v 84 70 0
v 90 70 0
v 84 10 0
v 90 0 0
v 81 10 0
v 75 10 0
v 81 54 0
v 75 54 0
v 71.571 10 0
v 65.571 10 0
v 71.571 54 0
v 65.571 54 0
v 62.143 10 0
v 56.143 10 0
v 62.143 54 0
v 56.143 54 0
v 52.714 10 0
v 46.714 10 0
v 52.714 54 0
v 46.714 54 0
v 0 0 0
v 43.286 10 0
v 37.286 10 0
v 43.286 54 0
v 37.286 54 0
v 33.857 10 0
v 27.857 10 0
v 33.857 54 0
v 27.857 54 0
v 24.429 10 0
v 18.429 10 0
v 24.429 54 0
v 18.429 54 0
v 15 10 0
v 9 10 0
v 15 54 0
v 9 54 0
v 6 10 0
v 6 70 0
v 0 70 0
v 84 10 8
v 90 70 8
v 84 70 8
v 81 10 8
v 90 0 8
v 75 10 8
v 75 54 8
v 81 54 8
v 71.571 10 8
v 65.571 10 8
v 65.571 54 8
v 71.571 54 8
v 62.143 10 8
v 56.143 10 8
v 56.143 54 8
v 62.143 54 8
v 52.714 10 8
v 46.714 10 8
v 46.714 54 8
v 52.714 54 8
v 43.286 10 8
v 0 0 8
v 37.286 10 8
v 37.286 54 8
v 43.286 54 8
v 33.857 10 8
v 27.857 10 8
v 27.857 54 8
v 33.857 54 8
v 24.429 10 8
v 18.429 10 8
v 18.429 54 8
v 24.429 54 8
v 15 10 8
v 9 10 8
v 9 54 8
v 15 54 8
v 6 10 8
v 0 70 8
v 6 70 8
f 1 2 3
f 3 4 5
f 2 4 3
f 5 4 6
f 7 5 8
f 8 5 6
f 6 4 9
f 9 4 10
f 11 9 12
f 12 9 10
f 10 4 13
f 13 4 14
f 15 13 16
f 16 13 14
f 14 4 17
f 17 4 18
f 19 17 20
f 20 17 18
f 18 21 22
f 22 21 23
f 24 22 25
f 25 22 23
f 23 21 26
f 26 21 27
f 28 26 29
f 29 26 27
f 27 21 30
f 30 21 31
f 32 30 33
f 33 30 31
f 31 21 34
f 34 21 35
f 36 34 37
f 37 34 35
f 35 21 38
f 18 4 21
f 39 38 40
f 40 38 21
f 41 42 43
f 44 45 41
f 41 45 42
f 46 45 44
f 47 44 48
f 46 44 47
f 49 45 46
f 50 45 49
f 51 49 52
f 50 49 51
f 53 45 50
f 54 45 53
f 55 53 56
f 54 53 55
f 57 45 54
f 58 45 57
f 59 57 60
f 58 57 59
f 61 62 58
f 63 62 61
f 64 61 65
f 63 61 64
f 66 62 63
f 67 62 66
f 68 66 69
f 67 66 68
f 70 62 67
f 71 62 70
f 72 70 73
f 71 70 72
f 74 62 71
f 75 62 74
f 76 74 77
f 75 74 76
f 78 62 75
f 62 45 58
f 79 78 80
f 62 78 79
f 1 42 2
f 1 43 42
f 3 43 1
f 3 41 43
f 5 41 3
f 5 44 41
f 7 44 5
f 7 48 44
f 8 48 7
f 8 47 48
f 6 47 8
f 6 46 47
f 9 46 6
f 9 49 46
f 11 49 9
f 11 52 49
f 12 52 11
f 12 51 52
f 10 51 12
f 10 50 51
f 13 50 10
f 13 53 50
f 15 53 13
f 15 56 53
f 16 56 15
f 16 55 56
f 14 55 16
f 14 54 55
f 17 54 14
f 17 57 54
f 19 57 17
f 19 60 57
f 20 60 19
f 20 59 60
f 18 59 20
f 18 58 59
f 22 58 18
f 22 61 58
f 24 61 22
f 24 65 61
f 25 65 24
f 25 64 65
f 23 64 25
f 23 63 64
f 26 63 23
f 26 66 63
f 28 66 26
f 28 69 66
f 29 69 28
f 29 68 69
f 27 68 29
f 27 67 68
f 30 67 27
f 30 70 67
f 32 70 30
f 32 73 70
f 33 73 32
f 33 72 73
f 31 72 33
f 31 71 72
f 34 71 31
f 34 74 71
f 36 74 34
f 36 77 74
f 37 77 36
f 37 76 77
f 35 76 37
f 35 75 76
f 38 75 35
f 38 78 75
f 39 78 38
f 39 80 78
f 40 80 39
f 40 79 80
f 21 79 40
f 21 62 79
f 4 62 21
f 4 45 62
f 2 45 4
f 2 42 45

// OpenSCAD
$fn = 32;

// ----------------------------------------------------------------------
// Guard grille: 8 slats over a 90 x 70 mm plate
// ----------------------------------------------------------------------

// --- parameters (mm) ---
profile_height = 8;       // extrusion height
profile_points = 40;      // points of the closed outline

profile = [[0, 0], [90, 0], [90, 70], [84, 70], [84, 10], [81, 10], [81, 54], [75, 54], [75, 10], [71.571, 10], [71.571, 54], [65.571, 54], [65.571, 10], [62.143, 10], [62.143, 54], [56.143, 54], [56.143, 10], [52.714, 10], [52.714, 54], [46.714, 54], [46.714, 10], [43.286, 10], [43.286, 54], [37.286, 54], [37.286, 10], [33.857, 10], [33.857, 54], [27.857, 54], [27.857, 10], [24.429, 10], [24.429, 54], [18.429, 54], [18.429, 10], [15, 10], [15, 54], [9, 54], [9, 10], [6, 10], [6, 70], [0, 70]];  // single closed polygon, 40 points, counter clockwise

// --- the one profile operation ---
linear_extrude(height = profile_height) polygon(points = profile);
